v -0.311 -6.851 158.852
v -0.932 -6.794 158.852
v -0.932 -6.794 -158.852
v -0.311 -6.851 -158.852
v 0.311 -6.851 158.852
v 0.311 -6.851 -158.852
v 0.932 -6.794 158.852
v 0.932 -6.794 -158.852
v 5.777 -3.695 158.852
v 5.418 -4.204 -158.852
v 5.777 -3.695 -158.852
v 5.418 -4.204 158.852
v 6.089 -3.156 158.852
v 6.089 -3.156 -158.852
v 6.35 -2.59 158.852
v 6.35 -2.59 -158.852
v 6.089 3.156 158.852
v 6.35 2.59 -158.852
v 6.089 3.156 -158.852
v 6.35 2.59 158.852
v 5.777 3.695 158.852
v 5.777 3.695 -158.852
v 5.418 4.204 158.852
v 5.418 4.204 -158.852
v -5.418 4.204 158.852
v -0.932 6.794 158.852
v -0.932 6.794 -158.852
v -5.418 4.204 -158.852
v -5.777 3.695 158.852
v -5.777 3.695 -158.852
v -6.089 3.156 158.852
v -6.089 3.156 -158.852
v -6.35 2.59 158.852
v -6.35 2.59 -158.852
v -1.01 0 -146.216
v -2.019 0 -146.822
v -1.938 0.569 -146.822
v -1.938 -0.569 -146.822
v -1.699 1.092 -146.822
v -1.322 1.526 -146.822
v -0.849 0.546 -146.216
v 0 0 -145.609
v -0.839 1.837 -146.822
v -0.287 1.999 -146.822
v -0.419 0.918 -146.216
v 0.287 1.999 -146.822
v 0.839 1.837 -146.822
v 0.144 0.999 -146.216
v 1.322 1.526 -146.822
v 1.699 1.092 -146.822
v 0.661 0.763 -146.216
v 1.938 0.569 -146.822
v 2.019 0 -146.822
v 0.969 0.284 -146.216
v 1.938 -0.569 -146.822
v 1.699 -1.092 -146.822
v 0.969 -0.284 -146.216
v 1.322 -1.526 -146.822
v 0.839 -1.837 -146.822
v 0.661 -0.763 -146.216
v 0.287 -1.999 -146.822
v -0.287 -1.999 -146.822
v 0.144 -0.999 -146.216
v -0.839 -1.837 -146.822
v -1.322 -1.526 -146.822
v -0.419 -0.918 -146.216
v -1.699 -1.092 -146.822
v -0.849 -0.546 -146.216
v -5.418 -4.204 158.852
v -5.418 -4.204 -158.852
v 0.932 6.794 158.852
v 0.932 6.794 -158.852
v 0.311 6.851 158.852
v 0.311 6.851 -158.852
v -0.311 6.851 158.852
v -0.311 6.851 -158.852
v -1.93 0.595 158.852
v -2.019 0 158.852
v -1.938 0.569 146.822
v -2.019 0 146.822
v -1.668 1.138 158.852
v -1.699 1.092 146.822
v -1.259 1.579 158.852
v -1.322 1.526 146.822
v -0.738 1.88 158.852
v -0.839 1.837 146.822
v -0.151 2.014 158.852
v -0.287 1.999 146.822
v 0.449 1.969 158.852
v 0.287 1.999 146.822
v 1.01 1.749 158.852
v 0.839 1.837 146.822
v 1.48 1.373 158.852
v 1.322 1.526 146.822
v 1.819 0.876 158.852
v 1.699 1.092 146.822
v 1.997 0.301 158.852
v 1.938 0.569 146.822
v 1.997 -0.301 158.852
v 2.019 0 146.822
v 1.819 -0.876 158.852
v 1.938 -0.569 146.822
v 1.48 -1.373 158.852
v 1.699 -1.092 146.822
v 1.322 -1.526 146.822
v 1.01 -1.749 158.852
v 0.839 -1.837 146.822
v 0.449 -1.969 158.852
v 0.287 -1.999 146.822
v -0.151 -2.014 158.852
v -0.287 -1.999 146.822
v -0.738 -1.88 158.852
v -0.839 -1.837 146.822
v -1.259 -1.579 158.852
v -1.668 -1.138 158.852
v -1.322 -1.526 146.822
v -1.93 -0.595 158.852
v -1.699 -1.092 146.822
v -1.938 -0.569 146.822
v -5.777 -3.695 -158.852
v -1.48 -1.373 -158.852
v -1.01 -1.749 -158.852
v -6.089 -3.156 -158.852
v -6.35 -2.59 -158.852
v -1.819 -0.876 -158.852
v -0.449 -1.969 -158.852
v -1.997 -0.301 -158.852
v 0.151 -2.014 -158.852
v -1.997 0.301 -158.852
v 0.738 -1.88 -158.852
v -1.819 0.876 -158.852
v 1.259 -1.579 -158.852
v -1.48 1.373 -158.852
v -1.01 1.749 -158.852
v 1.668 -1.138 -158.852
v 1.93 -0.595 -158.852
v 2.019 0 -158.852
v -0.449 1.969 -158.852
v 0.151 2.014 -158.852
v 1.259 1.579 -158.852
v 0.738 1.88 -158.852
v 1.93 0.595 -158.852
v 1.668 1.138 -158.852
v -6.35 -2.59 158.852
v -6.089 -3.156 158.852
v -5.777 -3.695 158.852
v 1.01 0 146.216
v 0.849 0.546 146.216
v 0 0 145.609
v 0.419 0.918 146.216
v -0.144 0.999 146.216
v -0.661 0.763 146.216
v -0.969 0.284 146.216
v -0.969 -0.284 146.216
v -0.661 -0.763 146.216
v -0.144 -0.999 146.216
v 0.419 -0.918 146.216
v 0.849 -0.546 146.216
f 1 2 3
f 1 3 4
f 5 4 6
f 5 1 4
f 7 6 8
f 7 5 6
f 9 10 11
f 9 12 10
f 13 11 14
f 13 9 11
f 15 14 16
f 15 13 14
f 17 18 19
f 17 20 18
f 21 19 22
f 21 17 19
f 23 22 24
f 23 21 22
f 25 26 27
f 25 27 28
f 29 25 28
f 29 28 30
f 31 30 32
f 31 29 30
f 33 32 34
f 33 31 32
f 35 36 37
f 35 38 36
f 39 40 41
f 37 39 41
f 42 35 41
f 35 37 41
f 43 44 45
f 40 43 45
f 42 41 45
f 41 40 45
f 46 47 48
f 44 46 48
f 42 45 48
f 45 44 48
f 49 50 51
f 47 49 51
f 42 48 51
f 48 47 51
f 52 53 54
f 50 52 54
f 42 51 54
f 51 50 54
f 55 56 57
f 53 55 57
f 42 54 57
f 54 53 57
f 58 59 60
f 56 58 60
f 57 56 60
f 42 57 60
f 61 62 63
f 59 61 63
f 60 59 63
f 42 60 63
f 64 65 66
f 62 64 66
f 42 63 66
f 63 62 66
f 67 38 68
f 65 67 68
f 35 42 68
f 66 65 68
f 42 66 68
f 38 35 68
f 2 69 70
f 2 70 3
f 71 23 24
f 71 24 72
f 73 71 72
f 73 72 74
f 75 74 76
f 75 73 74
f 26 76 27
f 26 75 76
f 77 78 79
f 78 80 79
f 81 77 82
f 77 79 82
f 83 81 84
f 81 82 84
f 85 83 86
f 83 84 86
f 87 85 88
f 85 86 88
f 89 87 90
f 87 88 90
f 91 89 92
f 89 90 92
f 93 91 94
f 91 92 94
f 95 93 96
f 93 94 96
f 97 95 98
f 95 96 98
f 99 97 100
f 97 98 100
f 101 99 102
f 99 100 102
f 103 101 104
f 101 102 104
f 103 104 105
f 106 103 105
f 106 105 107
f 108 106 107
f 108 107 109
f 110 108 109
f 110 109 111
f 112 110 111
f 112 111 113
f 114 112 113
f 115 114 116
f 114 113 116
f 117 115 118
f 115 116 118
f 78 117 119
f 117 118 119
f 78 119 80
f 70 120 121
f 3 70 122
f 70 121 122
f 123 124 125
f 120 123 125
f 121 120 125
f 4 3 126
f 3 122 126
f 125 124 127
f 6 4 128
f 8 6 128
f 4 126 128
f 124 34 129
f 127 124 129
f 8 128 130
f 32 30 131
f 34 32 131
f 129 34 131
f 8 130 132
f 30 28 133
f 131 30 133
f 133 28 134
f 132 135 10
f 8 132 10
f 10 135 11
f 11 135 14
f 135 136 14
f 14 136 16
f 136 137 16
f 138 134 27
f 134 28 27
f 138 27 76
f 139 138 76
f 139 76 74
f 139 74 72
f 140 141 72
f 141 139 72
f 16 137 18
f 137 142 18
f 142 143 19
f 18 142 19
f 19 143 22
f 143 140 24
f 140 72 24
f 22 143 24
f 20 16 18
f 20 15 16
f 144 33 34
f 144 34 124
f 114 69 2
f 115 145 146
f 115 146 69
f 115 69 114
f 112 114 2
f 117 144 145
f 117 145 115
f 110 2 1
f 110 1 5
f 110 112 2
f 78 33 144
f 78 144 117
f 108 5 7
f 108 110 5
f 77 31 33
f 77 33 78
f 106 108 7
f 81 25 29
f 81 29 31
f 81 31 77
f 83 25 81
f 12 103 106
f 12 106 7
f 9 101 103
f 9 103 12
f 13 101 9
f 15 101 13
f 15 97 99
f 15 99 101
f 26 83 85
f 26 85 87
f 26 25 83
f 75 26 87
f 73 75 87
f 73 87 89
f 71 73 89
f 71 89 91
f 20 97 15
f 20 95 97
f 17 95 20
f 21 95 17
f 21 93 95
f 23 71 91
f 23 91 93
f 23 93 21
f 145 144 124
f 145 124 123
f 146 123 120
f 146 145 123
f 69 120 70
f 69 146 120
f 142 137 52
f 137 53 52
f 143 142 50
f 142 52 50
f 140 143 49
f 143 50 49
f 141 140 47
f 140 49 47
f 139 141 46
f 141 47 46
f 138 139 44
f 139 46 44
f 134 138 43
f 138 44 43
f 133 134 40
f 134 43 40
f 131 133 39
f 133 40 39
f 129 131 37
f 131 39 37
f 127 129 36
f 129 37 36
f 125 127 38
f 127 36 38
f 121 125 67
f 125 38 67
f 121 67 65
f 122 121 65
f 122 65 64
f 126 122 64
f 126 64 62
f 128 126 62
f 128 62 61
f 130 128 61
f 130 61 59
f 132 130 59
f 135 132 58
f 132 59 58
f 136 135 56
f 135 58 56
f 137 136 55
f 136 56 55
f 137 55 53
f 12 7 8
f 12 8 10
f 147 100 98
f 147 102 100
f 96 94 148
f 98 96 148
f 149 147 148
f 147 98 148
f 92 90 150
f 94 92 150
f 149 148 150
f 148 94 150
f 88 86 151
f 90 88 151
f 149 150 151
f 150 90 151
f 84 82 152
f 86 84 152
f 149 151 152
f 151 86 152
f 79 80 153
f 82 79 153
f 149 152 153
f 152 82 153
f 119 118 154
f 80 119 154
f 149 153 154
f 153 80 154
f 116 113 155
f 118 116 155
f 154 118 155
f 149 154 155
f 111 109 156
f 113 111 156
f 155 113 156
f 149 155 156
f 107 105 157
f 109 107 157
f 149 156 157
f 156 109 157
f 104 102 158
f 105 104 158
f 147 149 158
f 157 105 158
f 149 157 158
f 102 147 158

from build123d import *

# Parameters (mm, degrees)
BOSS_EXTRUDE1_DEPTH                  = 158.8516
F_10_32_TAPPED_HOLE1_D               = 4.0386
F_10_32_TAPPED_HOLE1_DEPTH           = 12.02944
F_10_32_TAPPED_HOLE1_TIP             = 1.213317848
F_10_32_TAPPED_HOLE1_ON_FACE_2_D     = 4.0386
F_10_32_TAPPED_HOLE1_ON_FACE_2_DEPTH = 12.02944
F_10_32_TAPPED_HOLE1_ON_FACE_2_TIP   = 1.213317848


with BuildPart() as part:
    # Sketch1 → Boss-Extrude1 (new, symmetric)
    with BuildSketch(Plane.XY):
        with BuildLine():
            ThreePointArc((6.35, 2.590301913), (5.939202219, 3.429), (5.41826726, 4.204110358))
            Line((5.41826726, 4.204110358), (0.93173274, 6.79441227))
            ThreePointArc((0.93173274, 6.79441227), (0, 6.858), (-0.93173274, 6.79441227))
            Line((-0.93173274, 6.79441227), (-5.41826726, 4.204110358))
            ThreePointArc((-5.41826726, 4.204110358), (-5.939202219, 3.429), (-6.35, 2.590301913))
            Line((-6.35, 2.590301913), (-6.35, -2.590301913))
            ThreePointArc((-6.35, -2.590301913), (-5.939202219, -3.429), (-5.41826726, -4.204110358))
            Line((-5.41826726, -4.204110358), (-0.93173274, -6.79441227))
            ThreePointArc((-0.93173274, -6.79441227), (0, -6.858), (0.93173274, -6.79441227))
            Line((0.93173274, -6.79441227), (5.41826726, -4.204110358))
            ThreePointArc((5.41826726, -4.204110358), (5.939202219, -3.429), (6.35, -2.590301913))
            Line((6.35, -2.590301913), (6.35, 2.590301913))
        make_face()
    extrude(amount=BOSS_EXTRUDE1_DEPTH, both=True)

    # #10-32 Tapped Hole1
    with Locations(Plane(origin=(0, 0, -158.8516), x_dir=(-1, 0, 0), z_dir=(0, 0, -1))):
        with Locations((0, 0)):
            Hole(F_10_32_TAPPED_HOLE1_D / 2, depth=F_10_32_TAPPED_HOLE1_DEPTH)
            with Locations((0, 0, -(F_10_32_TAPPED_HOLE1_DEPTH + F_10_32_TAPPED_HOLE1_TIP / 2))):  # 118° drill point
                Cone(0, F_10_32_TAPPED_HOLE1_D / 2, F_10_32_TAPPED_HOLE1_TIP, mode=Mode.SUBTRACT)

    # #10-32 Tapped Hole1 on face 2
    with Locations(Plane.XY.offset(158.8516)):
        with Locations((0, 0)):
            Hole(F_10_32_TAPPED_HOLE1_ON_FACE_2_D / 2, depth=F_10_32_TAPPED_HOLE1_ON_FACE_2_DEPTH)
            with Locations((0, 0, -(F_10_32_TAPPED_HOLE1_ON_FACE_2_DEPTH + F_10_32_TAPPED_HOLE1_ON_FACE_2_TIP / 2))):  # 118° drill point
                Cone(0, F_10_32_TAPPED_HOLE1_ON_FACE_2_D / 2, F_10_32_TAPPED_HOLE1_ON_FACE_2_TIP, mode=Mode.SUBTRACT)


solid = part.part
